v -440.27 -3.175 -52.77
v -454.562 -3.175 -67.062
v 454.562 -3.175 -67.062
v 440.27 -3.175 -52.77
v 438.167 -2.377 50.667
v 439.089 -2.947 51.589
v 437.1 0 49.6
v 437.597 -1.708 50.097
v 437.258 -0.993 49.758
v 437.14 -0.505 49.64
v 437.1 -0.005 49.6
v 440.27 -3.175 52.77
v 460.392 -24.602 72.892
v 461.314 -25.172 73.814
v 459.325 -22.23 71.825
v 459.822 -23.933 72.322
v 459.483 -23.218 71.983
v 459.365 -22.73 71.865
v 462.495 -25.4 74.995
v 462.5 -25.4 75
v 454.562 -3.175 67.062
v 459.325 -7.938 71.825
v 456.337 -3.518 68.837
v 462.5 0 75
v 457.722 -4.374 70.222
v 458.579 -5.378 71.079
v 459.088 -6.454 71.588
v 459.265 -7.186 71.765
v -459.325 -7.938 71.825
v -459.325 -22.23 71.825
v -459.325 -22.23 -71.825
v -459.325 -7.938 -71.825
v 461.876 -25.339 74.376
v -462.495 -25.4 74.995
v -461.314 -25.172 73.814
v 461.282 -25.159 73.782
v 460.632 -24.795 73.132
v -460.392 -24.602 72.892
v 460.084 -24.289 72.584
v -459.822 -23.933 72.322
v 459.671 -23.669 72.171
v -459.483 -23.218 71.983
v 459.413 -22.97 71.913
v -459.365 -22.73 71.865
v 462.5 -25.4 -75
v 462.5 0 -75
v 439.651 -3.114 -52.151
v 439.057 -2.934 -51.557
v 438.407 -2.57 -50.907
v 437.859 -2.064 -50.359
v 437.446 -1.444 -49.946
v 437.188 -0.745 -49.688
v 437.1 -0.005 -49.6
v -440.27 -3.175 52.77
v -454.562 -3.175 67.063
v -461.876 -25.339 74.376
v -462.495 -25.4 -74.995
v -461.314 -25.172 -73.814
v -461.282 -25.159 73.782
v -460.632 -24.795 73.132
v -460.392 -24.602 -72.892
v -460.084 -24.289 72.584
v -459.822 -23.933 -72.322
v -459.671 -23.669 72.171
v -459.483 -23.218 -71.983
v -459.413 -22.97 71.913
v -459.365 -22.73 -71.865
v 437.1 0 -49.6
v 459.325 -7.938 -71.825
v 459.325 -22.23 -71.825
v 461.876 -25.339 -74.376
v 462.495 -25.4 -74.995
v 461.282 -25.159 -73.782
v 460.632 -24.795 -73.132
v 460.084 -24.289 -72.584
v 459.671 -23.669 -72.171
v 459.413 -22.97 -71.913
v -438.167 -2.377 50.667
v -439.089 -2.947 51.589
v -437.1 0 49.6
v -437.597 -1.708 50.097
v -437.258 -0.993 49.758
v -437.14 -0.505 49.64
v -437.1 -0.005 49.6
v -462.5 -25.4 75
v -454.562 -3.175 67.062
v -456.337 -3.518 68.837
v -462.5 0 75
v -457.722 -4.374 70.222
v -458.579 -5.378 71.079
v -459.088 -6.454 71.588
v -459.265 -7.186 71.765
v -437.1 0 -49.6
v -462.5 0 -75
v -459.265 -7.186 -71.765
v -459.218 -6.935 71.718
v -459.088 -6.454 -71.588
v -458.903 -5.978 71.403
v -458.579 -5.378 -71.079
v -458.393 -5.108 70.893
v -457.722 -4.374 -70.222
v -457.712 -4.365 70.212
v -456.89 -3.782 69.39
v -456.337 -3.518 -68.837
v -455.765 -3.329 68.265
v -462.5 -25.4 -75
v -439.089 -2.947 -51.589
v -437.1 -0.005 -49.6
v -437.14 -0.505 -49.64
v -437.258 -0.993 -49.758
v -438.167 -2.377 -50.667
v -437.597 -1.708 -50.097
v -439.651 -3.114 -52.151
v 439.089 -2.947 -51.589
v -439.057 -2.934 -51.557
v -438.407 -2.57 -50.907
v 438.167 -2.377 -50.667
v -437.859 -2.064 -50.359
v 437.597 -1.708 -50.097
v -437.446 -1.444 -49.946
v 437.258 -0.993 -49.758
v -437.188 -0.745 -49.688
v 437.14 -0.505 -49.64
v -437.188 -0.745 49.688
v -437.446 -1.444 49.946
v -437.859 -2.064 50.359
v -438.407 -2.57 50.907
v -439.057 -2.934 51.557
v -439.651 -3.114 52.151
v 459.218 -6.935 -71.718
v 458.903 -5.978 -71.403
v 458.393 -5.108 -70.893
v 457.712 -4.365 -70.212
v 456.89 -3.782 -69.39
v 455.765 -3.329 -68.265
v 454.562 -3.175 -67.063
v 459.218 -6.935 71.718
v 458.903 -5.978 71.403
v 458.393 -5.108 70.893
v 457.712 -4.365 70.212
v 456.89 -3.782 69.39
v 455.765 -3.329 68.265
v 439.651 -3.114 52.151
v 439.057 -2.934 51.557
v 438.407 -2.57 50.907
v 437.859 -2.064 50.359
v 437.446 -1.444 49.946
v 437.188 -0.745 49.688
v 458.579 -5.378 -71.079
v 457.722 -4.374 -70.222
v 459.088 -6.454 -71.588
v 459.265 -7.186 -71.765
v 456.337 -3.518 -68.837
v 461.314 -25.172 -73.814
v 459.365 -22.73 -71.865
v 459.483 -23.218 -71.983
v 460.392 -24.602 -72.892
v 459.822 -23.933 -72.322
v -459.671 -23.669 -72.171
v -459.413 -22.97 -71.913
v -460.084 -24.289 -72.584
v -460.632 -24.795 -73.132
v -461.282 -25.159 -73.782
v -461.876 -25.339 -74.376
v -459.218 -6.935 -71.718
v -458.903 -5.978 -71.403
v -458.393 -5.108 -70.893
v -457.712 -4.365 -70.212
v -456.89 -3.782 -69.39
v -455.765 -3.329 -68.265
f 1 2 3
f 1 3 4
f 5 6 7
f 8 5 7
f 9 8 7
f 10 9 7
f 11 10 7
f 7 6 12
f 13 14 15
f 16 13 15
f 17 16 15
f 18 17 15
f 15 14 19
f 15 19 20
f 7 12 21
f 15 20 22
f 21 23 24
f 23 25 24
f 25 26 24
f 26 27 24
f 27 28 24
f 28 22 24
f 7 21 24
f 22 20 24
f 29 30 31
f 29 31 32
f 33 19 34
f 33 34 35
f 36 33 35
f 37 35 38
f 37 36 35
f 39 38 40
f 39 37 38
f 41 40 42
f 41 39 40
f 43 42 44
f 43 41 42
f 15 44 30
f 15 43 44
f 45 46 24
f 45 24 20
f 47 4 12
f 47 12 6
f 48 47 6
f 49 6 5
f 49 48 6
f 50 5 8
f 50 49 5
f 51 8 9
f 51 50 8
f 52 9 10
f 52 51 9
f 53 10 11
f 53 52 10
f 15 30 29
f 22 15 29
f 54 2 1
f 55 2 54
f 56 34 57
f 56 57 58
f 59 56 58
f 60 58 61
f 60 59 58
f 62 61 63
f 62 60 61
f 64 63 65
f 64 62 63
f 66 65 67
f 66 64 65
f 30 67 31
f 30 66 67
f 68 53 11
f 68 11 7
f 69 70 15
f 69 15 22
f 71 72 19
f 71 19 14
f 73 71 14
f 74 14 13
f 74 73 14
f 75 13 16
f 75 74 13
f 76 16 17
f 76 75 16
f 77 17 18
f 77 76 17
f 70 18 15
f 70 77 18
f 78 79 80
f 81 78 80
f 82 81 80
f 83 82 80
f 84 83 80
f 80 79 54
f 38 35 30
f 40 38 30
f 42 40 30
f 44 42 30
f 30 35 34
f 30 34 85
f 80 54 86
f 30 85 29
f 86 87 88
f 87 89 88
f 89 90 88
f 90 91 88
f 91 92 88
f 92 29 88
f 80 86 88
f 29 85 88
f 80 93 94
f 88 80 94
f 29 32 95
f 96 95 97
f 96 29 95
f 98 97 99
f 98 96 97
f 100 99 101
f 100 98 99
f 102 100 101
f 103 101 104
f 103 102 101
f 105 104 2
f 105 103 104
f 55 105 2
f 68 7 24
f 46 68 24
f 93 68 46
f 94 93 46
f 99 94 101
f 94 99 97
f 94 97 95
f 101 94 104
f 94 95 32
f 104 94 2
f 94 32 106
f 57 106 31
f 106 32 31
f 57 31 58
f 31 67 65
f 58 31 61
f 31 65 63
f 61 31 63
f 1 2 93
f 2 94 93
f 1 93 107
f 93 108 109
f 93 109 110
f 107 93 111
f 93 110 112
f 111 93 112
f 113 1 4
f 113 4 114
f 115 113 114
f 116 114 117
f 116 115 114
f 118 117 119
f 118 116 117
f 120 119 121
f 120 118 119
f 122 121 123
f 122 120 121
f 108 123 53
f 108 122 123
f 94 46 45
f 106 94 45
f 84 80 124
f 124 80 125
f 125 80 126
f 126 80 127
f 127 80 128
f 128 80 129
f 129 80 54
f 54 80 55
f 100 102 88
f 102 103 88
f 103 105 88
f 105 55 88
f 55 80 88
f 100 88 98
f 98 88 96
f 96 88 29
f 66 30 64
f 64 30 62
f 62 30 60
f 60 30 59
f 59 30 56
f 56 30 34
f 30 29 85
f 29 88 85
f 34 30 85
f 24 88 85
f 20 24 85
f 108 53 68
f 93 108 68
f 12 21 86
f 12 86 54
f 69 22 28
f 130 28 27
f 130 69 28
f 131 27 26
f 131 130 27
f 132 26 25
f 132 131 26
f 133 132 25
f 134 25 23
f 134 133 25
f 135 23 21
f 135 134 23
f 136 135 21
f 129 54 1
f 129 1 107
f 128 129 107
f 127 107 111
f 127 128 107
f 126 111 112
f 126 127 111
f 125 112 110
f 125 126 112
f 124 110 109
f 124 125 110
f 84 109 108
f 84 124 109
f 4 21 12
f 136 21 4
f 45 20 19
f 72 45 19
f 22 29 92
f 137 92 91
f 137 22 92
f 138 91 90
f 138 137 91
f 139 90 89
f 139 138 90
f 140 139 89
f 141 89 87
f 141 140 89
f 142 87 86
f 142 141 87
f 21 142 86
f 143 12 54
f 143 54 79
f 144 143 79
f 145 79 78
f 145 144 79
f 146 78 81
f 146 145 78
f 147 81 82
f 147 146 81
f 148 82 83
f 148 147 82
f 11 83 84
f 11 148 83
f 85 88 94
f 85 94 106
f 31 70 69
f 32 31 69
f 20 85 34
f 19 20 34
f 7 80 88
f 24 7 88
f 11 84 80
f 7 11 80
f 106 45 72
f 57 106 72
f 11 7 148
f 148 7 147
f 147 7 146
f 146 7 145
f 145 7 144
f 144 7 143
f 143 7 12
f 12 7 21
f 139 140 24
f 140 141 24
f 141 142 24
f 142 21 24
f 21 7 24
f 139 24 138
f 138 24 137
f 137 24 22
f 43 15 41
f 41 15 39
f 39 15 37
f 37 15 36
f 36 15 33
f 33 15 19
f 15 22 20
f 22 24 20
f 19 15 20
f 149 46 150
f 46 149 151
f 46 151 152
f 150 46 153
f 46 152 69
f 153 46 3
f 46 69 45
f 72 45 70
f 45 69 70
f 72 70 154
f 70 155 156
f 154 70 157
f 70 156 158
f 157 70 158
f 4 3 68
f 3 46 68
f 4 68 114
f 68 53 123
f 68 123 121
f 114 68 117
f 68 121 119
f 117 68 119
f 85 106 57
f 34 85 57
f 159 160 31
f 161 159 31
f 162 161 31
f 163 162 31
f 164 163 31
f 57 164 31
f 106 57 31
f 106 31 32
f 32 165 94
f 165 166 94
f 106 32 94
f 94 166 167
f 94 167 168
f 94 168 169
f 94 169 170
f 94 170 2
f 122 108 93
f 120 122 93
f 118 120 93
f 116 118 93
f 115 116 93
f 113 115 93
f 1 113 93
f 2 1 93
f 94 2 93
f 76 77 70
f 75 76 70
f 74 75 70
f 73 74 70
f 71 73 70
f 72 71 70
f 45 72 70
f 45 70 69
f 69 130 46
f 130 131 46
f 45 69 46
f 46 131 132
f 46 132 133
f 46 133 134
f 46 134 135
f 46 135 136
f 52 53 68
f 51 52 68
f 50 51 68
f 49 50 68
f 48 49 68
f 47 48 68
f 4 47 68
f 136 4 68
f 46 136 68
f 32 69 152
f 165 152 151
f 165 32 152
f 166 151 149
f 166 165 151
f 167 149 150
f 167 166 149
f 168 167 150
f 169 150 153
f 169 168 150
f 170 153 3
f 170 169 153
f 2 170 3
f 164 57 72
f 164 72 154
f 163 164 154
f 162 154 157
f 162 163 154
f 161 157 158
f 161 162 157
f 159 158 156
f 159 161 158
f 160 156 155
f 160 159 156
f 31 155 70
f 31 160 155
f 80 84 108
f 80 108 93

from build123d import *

# Parameters (mm, degrees)
HIERRO_ANGULAR_1_X_1_X_0_125_1_DEPTH      = 961.921024484
HIERRO_ANGULAR_1_X_1_X_0_125_1_DEPTH_BACK = 36.921024484
HIERRO_ANGULAR_1_X_1_X_0_125_1_2_DEPTH    = 223.842048969
HIERRO_ANGULAR_1_X_1_X_0_125_1_3_DEPTH    = 998.842048969
HIERRO_ANGULAR_1_X_1_X_0_125_1_4_DEPTH    = 223.842048969


with BuildPart() as part:
    # Sketch11 → Hierro angular 1 X 1 X 0.125(1) (new, two sides: drawn at the far end of the back side and taken through both)
    with BuildSketch(Plane(origin=(462.5, 0, 75), x_dir=(0, 0, -1), z_dir=(-1, 0, 0)).offset(-HIERRO_ANGULAR_1_X_1_X_0_125_1_DEPTH_BACK)):
        with BuildLine():
            Line((0, 0), (0, 25.4))
            Line((0, 25.4), (0.00508, 25.4))
            ThreePointArc((0.00508, 25.4), (2.246551928, 24.471551928), (3.175, 22.23008))
            Line((3.175, 22.23008), (3.175, 7.9375))
            ThreePointArc((3.175, 7.9375), (4.569903955, 4.569903955), (7.9375, 3.175))
            Line((7.9375, 3.175), (22.23008, 3.175))
            ThreePointArc((22.23008, 3.175), (24.471551928, 2.246551928), (25.4, 0.00508))
            Line((25.4, 0.00508), (25.4, 0))
            Line((25.4, 0), (0, 0))
        make_face()
    extrude(amount=HIERRO_ANGULAR_1_X_1_X_0_125_1_DEPTH + HIERRO_ANGULAR_1_X_1_X_0_125_1_DEPTH_BACK)

    # Hierro angular 1 X 1 X 0.125(1) mitre 1
    split(bisect_by=Plane(origin=(462.5, 0, 75), x_dir=(0, -1, 0), z_dir=(-0.707106781, 0, 0.707106781)), keep=Keep.TOP)

    # Hierro angular 1 X 1 X 0.125(1) mitre 2
    split(bisect_by=Plane(origin=(-462.5, 0, 75), x_dir=(0, 1, 0), z_dir=(0.707106781, 0, 0.707106781)), keep=Keep.TOP)


with BuildPart() as body_2:
    # Sketch11 on segment 2 (carried to segment 2) → Hierro angular 1 X 1 X 0.125_1 2 (new body)
    with BuildSketch(Plane(origin=(-462.5, 0, 111.921024484), x_dir=(1, 0, 0), z_dir=(0, 0, -1))):
        with BuildLine():
            Line((0, 0), (0, 25.4))
            Line((0, 25.4), (0.00508, 25.4))
            ThreePointArc((0.00508, 25.4), (2.246551928, 24.471551928), (3.175, 22.23008))
            Line((3.175, 22.23008), (3.175, 7.9375))
            ThreePointArc((3.175, 7.9375), (4.569903955, 4.569903955), (7.9375, 3.175))
            Line((7.9375, 3.175), (22.23008, 3.175))
            ThreePointArc((22.23008, 3.175), (24.471551928, 2.246551928), (25.4, 0.00508))
            Line((25.4, 0.00508), (25.4, 0))
            Line((25.4, 0), (0, 0))
        make_face()
    extrude(amount=HIERRO_ANGULAR_1_X_1_X_0_125_1_2_DEPTH)

    # Hierro angular 1 X 1 X 0.125_1 2 mitre 1
    split(bisect_by=Plane(origin=(-462.5, 0, 75), x_dir=(0, -1, 0), z_dir=(-0.707106781, 0, -0.707106781)), keep=Keep.TOP)

    # Hierro angular 1 X 1 X 0.125_1 2 mitre 2
    split(bisect_by=Plane(origin=(-462.5, 0, -75), x_dir=(0, -1, 0), z_dir=(-0.707106781, 0, 0.707106781)), keep=Keep.TOP)


with BuildPart() as body_3:
    # Sketch11 on segment 3 (carried to segment 3) → Hierro angular 1 X 1 X 0.125_1 3 (new body)
    with BuildSketch(Plane(origin=(-499.421024484, 0, -75), x_dir=(0, 0, 1), z_dir=(1, 0, 0))):
        with BuildLine():
            Line((0, 0), (0, 25.4))
            Line((0, 25.4), (0.00508, 25.4))
            ThreePointArc((0.00508, 25.4), (2.246551928, 24.471551928), (3.175, 22.23008))
            Line((3.175, 22.23008), (3.175, 7.9375))
            ThreePointArc((3.175, 7.9375), (4.569903955, 4.569903955), (7.9375, 3.175))
            Line((7.9375, 3.175), (22.23008, 3.175))
            ThreePointArc((22.23008, 3.175), (24.471551928, 2.246551928), (25.4, 0.00508))
            Line((25.4, 0.00508), (25.4, 0))
            Line((25.4, 0), (0, 0))
        make_face()
    extrude(amount=HIERRO_ANGULAR_1_X_1_X_0_125_1_3_DEPTH)

    # Hierro angular 1 X 1 X 0.125_1 3 mitre 1
    split(bisect_by=Plane(origin=(462.5, 0, -75), x_dir=(0, -1, 0), z_dir=(-0.707106781, 0, -0.707106781)), keep=Keep.TOP)

    # Hierro angular 1 X 1 X 0.125_1 3 mitre 2
    split(bisect_by=Plane(origin=(-462.5, 0, -75), x_dir=(0, 1, 0), z_dir=(0.707106781, 0, -0.707106781)), keep=Keep.TOP)


with BuildPart() as body_4:
    # Sketch11 on segment 4 (carried to segment 4) → Hierro angular 1 X 1 X 0.125_1 4 (new body)
    with BuildSketch(Plane(origin=(462.5, 0, -111.921024484), x_dir=(-1, 0, 0), z_dir=(0, 0, 1))):
        with BuildLine():
            Line((0, 0), (0, 25.4))
            Line((0, 25.4), (0.00508, 25.4))
            ThreePointArc((0.00508, 25.4), (2.246551928, 24.471551928), (3.175, 22.23008))
            Line((3.175, 22.23008), (3.175, 7.9375))
            ThreePointArc((3.175, 7.9375), (4.569903955, 4.569903955), (7.9375, 3.175))
            Line((7.9375, 3.175), (22.23008, 3.175))
            ThreePointArc((22.23008, 3.175), (24.471551928, 2.246551928), (25.4, 0.00508))
            Line((25.4, 0.00508), (25.4, 0))
            Line((25.4, 0), (0, 0))
        make_face()
    extrude(amount=HIERRO_ANGULAR_1_X_1_X_0_125_1_4_DEPTH)

    # Hierro angular 1 X 1 X 0.125_1 4 mitre 1
    split(bisect_by=Plane(origin=(462.5, 0, 75), x_dir=(0, 1, 0), z_dir=(0.707106781, 0, -0.707106781)), keep=Keep.TOP)

    # Hierro angular 1 X 1 X 0.125_1 4 mitre 2
    split(bisect_by=Plane(origin=(462.5, 0, -75), x_dir=(0, 1, 0), z_dir=(0.707106781, 0, 0.707106781)), keep=Keep.TOP)


solid = Compound([part.part, body_2.part, body_3.part, body_4.part])
